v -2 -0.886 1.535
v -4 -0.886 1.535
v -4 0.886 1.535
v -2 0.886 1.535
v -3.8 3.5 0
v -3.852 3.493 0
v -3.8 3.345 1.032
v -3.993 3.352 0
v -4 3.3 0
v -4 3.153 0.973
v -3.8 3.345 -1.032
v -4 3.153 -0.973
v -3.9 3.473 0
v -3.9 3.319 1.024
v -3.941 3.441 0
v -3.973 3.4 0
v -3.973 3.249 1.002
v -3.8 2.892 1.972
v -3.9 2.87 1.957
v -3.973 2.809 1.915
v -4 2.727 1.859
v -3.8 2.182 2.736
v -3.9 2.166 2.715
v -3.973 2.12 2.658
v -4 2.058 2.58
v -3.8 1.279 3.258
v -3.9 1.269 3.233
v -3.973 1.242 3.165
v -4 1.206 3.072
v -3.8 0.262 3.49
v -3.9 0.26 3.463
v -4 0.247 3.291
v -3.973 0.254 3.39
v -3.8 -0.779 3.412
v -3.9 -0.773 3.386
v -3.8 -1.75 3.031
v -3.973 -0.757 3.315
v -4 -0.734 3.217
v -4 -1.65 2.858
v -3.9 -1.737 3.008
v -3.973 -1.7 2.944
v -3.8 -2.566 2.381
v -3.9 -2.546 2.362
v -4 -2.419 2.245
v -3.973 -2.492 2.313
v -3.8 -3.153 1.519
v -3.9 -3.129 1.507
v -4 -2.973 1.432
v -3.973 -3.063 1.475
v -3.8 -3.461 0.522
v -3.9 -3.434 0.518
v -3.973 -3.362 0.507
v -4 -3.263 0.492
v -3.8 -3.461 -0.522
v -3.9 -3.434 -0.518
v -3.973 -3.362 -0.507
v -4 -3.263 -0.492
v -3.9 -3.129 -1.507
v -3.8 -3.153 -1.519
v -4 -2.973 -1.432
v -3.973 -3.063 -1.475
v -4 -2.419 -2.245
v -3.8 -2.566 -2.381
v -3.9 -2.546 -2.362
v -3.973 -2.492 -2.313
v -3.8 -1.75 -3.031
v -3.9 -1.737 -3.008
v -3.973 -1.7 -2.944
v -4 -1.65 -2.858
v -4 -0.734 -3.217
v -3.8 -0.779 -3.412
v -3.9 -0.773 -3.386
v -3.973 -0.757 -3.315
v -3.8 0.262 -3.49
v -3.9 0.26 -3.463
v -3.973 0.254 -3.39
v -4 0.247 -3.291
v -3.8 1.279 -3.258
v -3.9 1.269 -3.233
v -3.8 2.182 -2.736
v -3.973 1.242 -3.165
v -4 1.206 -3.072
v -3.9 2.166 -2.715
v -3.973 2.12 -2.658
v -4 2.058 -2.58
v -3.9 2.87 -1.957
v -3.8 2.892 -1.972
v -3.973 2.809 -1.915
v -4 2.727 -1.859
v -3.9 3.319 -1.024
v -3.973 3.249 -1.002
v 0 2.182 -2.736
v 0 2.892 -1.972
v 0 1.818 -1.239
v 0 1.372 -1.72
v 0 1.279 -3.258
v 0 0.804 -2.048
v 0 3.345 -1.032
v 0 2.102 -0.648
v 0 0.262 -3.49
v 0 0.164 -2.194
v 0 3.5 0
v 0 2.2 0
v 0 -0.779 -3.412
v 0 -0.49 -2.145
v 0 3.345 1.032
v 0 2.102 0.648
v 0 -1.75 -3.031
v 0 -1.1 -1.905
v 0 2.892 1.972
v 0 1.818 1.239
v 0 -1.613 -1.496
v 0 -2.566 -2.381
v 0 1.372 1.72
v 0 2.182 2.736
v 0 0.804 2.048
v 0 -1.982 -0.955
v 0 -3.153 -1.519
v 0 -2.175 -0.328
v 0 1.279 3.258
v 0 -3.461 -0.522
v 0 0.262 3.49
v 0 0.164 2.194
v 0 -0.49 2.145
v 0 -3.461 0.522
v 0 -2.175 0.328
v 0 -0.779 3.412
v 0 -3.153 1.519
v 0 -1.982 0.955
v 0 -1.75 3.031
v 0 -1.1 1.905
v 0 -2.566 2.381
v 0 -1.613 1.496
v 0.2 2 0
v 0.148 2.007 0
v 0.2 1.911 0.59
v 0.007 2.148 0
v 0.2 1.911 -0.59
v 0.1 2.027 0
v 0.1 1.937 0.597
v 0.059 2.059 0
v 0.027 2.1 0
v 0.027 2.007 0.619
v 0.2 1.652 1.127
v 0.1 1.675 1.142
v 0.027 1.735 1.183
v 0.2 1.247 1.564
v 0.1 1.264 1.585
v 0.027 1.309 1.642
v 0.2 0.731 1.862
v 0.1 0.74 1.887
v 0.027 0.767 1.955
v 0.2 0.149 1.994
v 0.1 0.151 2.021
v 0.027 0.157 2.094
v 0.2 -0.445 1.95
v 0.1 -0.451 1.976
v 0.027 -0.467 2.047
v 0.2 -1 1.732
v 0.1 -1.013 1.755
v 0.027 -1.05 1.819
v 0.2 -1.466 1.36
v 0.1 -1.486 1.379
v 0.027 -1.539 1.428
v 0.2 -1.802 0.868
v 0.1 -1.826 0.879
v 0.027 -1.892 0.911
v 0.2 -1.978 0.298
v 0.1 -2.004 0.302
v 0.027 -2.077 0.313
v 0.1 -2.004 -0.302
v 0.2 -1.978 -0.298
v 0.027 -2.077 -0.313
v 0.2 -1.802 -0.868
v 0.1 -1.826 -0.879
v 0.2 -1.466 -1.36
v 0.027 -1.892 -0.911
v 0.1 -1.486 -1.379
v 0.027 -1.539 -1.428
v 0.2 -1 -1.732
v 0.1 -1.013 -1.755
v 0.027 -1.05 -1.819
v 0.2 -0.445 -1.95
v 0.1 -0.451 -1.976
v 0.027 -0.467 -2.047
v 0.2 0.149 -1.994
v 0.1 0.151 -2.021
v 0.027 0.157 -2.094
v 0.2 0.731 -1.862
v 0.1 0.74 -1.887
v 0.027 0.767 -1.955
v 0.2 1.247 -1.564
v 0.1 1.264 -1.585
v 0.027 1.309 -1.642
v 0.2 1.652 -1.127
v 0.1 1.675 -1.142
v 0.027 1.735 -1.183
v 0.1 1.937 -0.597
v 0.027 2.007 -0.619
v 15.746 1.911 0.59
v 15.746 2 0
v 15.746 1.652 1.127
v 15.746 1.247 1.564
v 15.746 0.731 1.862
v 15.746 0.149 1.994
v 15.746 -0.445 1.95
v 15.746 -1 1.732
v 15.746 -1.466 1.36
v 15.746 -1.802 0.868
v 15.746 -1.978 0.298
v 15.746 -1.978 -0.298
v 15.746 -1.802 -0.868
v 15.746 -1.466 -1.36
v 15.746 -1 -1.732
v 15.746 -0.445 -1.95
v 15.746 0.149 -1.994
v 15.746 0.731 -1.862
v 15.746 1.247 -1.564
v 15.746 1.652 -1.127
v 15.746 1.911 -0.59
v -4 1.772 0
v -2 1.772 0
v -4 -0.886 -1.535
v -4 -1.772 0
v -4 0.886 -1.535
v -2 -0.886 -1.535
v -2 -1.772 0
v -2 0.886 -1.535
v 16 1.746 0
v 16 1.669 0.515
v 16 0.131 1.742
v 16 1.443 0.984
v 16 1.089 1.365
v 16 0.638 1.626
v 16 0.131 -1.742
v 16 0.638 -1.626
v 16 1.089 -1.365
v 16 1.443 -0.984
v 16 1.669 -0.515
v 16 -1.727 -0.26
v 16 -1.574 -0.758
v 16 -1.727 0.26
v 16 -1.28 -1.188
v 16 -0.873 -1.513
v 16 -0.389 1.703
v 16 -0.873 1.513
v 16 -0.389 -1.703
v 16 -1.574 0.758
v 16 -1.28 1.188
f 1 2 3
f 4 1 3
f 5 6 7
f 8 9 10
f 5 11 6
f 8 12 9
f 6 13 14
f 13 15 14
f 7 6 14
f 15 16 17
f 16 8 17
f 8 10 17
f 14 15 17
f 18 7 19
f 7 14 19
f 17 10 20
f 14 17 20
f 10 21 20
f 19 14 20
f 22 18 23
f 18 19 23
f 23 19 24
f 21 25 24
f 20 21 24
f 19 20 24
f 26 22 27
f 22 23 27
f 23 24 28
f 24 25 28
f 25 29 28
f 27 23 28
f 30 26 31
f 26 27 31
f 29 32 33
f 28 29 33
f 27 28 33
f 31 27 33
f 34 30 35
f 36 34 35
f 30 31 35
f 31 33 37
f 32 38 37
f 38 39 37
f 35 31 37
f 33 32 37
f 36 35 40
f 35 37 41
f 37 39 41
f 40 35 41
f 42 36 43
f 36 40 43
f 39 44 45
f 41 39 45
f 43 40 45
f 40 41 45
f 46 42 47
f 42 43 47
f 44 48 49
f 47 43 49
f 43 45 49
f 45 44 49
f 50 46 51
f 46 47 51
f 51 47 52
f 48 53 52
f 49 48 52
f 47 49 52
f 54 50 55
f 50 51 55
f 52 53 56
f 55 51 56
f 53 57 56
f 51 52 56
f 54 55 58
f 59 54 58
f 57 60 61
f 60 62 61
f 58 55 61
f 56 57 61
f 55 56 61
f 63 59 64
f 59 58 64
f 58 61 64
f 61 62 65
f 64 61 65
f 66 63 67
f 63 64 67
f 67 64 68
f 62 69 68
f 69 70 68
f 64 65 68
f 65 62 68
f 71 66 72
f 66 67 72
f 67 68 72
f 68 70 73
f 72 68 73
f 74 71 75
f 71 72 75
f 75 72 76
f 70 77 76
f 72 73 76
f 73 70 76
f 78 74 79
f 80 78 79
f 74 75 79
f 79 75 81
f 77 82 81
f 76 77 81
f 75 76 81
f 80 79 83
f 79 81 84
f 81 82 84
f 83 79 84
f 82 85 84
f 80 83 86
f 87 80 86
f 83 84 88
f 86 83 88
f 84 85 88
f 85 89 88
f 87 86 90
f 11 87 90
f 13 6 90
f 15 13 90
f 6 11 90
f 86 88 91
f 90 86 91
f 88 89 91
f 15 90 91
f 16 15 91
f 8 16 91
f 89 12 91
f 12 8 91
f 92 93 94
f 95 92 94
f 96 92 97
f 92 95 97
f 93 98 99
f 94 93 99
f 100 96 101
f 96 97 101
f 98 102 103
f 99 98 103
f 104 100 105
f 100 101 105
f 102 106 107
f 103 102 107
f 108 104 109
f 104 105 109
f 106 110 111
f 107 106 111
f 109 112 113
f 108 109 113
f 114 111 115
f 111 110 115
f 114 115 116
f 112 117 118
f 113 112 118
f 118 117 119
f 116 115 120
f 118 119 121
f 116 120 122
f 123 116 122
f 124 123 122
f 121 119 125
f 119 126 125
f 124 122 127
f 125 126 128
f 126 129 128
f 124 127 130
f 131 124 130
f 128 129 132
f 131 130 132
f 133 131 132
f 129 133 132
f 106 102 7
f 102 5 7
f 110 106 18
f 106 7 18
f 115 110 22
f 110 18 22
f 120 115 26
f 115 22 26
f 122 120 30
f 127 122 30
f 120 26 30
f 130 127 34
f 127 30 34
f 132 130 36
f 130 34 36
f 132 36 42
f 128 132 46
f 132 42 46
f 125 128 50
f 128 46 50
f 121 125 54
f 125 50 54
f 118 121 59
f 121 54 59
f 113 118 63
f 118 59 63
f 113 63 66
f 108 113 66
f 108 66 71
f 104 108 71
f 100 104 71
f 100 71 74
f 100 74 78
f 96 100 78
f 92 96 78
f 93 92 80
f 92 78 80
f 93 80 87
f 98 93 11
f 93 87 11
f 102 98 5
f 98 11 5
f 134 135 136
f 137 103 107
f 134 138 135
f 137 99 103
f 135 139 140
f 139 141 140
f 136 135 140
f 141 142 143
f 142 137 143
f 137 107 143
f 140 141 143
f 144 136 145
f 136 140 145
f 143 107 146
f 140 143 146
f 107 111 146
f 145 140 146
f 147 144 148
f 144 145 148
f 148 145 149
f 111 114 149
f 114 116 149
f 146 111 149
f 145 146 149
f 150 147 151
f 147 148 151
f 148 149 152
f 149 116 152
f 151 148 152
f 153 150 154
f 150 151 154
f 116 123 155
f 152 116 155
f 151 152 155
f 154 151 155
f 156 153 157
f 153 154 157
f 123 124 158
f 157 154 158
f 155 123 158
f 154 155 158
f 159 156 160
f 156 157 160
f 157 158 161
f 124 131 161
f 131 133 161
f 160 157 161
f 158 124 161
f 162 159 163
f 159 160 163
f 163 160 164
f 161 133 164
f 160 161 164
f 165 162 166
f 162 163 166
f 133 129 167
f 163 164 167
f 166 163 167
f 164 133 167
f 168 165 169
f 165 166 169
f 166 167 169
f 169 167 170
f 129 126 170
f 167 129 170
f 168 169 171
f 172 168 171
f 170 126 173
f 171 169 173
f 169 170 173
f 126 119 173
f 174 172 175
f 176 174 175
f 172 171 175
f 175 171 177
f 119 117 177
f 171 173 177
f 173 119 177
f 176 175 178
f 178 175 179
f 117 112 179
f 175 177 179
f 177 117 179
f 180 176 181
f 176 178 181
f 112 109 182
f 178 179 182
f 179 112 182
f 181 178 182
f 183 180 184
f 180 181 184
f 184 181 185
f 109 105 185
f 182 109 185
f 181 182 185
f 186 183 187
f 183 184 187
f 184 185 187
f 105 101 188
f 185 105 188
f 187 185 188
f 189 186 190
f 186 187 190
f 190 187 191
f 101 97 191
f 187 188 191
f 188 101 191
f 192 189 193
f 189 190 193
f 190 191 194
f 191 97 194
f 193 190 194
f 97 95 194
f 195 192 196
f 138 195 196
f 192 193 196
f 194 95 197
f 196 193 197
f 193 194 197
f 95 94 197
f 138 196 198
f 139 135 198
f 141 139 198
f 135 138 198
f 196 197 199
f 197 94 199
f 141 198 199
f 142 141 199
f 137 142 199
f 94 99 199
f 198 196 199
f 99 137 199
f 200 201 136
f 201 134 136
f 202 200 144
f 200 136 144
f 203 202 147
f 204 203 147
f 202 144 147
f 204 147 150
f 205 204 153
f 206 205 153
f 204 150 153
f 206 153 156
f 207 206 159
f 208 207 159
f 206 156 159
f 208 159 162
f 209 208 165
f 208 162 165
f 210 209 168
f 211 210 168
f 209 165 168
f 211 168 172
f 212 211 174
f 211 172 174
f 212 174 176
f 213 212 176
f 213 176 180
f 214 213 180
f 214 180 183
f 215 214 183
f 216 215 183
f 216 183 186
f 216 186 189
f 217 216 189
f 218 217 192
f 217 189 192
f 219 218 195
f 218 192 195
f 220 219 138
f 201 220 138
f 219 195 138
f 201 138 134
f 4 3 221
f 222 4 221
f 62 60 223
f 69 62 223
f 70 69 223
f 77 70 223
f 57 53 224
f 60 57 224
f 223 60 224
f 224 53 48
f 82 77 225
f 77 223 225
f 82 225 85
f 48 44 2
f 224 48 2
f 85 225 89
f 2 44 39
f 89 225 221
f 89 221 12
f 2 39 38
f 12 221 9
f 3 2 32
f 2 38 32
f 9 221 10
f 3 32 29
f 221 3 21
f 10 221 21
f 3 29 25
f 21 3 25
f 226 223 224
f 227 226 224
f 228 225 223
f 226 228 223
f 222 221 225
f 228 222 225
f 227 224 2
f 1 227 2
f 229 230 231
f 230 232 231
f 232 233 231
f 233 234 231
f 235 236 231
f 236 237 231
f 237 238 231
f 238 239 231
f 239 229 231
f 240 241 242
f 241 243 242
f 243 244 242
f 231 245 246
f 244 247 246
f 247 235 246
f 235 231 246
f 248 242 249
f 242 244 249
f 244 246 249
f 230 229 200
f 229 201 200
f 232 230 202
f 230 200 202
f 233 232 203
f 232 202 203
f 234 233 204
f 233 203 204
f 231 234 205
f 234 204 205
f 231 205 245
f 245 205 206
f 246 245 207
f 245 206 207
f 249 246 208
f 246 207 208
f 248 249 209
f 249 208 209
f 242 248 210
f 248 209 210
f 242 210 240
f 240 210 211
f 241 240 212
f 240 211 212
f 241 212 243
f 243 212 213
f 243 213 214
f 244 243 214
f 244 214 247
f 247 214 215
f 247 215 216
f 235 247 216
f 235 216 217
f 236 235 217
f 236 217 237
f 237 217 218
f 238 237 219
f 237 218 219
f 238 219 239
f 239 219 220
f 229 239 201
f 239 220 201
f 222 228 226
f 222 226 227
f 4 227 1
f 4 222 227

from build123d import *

# Parameters (mm, degrees)
CUT_EXTRUDE1_DEPTH = 2


with BuildPart() as part:
    # Sketch1 → Revolve1 (revolve)
    with BuildSketch(Plane.XY):
        with BuildLine():
            Line((15.7465, 2), (0.2, 2))
            ThreePointArc((0.2, 2), (0.058578644, 2.058578644), (0, 2.2))
            Line((0, 2.2), (0, 3.5))
            Line((0, 3.5), (-3.8, 3.5))
            ThreePointArc((-3.8, 3.5), (-3.941421356, 3.441421356), (-4, 3.3))
            Line((-4, 3.3), (-4, 0))
            Line((-4, 0), (16, 0))
            Line((16, 0), (16, 1.7465))
            Line((16, 1.7465), (15.7465, 2))
        make_face()
    revolve(axis=Axis((-4, 0, 0), (1, 0, 0)))

    # Sketch2 → Cut-Extrude1 (cut)
    with BuildSketch(Plane.ZY.offset(4)):
        Polygon((1.535, 0.886232663), (0, 1.772465326), (-1.535, 0.886232663), (-1.535, -0.886232663), (0, -1.772465326), (1.535, -0.886232663), align=None)
    extrude(amount=-CUT_EXTRUDE1_DEPTH, mode=Mode.SUBTRACT)


solid = part.part
